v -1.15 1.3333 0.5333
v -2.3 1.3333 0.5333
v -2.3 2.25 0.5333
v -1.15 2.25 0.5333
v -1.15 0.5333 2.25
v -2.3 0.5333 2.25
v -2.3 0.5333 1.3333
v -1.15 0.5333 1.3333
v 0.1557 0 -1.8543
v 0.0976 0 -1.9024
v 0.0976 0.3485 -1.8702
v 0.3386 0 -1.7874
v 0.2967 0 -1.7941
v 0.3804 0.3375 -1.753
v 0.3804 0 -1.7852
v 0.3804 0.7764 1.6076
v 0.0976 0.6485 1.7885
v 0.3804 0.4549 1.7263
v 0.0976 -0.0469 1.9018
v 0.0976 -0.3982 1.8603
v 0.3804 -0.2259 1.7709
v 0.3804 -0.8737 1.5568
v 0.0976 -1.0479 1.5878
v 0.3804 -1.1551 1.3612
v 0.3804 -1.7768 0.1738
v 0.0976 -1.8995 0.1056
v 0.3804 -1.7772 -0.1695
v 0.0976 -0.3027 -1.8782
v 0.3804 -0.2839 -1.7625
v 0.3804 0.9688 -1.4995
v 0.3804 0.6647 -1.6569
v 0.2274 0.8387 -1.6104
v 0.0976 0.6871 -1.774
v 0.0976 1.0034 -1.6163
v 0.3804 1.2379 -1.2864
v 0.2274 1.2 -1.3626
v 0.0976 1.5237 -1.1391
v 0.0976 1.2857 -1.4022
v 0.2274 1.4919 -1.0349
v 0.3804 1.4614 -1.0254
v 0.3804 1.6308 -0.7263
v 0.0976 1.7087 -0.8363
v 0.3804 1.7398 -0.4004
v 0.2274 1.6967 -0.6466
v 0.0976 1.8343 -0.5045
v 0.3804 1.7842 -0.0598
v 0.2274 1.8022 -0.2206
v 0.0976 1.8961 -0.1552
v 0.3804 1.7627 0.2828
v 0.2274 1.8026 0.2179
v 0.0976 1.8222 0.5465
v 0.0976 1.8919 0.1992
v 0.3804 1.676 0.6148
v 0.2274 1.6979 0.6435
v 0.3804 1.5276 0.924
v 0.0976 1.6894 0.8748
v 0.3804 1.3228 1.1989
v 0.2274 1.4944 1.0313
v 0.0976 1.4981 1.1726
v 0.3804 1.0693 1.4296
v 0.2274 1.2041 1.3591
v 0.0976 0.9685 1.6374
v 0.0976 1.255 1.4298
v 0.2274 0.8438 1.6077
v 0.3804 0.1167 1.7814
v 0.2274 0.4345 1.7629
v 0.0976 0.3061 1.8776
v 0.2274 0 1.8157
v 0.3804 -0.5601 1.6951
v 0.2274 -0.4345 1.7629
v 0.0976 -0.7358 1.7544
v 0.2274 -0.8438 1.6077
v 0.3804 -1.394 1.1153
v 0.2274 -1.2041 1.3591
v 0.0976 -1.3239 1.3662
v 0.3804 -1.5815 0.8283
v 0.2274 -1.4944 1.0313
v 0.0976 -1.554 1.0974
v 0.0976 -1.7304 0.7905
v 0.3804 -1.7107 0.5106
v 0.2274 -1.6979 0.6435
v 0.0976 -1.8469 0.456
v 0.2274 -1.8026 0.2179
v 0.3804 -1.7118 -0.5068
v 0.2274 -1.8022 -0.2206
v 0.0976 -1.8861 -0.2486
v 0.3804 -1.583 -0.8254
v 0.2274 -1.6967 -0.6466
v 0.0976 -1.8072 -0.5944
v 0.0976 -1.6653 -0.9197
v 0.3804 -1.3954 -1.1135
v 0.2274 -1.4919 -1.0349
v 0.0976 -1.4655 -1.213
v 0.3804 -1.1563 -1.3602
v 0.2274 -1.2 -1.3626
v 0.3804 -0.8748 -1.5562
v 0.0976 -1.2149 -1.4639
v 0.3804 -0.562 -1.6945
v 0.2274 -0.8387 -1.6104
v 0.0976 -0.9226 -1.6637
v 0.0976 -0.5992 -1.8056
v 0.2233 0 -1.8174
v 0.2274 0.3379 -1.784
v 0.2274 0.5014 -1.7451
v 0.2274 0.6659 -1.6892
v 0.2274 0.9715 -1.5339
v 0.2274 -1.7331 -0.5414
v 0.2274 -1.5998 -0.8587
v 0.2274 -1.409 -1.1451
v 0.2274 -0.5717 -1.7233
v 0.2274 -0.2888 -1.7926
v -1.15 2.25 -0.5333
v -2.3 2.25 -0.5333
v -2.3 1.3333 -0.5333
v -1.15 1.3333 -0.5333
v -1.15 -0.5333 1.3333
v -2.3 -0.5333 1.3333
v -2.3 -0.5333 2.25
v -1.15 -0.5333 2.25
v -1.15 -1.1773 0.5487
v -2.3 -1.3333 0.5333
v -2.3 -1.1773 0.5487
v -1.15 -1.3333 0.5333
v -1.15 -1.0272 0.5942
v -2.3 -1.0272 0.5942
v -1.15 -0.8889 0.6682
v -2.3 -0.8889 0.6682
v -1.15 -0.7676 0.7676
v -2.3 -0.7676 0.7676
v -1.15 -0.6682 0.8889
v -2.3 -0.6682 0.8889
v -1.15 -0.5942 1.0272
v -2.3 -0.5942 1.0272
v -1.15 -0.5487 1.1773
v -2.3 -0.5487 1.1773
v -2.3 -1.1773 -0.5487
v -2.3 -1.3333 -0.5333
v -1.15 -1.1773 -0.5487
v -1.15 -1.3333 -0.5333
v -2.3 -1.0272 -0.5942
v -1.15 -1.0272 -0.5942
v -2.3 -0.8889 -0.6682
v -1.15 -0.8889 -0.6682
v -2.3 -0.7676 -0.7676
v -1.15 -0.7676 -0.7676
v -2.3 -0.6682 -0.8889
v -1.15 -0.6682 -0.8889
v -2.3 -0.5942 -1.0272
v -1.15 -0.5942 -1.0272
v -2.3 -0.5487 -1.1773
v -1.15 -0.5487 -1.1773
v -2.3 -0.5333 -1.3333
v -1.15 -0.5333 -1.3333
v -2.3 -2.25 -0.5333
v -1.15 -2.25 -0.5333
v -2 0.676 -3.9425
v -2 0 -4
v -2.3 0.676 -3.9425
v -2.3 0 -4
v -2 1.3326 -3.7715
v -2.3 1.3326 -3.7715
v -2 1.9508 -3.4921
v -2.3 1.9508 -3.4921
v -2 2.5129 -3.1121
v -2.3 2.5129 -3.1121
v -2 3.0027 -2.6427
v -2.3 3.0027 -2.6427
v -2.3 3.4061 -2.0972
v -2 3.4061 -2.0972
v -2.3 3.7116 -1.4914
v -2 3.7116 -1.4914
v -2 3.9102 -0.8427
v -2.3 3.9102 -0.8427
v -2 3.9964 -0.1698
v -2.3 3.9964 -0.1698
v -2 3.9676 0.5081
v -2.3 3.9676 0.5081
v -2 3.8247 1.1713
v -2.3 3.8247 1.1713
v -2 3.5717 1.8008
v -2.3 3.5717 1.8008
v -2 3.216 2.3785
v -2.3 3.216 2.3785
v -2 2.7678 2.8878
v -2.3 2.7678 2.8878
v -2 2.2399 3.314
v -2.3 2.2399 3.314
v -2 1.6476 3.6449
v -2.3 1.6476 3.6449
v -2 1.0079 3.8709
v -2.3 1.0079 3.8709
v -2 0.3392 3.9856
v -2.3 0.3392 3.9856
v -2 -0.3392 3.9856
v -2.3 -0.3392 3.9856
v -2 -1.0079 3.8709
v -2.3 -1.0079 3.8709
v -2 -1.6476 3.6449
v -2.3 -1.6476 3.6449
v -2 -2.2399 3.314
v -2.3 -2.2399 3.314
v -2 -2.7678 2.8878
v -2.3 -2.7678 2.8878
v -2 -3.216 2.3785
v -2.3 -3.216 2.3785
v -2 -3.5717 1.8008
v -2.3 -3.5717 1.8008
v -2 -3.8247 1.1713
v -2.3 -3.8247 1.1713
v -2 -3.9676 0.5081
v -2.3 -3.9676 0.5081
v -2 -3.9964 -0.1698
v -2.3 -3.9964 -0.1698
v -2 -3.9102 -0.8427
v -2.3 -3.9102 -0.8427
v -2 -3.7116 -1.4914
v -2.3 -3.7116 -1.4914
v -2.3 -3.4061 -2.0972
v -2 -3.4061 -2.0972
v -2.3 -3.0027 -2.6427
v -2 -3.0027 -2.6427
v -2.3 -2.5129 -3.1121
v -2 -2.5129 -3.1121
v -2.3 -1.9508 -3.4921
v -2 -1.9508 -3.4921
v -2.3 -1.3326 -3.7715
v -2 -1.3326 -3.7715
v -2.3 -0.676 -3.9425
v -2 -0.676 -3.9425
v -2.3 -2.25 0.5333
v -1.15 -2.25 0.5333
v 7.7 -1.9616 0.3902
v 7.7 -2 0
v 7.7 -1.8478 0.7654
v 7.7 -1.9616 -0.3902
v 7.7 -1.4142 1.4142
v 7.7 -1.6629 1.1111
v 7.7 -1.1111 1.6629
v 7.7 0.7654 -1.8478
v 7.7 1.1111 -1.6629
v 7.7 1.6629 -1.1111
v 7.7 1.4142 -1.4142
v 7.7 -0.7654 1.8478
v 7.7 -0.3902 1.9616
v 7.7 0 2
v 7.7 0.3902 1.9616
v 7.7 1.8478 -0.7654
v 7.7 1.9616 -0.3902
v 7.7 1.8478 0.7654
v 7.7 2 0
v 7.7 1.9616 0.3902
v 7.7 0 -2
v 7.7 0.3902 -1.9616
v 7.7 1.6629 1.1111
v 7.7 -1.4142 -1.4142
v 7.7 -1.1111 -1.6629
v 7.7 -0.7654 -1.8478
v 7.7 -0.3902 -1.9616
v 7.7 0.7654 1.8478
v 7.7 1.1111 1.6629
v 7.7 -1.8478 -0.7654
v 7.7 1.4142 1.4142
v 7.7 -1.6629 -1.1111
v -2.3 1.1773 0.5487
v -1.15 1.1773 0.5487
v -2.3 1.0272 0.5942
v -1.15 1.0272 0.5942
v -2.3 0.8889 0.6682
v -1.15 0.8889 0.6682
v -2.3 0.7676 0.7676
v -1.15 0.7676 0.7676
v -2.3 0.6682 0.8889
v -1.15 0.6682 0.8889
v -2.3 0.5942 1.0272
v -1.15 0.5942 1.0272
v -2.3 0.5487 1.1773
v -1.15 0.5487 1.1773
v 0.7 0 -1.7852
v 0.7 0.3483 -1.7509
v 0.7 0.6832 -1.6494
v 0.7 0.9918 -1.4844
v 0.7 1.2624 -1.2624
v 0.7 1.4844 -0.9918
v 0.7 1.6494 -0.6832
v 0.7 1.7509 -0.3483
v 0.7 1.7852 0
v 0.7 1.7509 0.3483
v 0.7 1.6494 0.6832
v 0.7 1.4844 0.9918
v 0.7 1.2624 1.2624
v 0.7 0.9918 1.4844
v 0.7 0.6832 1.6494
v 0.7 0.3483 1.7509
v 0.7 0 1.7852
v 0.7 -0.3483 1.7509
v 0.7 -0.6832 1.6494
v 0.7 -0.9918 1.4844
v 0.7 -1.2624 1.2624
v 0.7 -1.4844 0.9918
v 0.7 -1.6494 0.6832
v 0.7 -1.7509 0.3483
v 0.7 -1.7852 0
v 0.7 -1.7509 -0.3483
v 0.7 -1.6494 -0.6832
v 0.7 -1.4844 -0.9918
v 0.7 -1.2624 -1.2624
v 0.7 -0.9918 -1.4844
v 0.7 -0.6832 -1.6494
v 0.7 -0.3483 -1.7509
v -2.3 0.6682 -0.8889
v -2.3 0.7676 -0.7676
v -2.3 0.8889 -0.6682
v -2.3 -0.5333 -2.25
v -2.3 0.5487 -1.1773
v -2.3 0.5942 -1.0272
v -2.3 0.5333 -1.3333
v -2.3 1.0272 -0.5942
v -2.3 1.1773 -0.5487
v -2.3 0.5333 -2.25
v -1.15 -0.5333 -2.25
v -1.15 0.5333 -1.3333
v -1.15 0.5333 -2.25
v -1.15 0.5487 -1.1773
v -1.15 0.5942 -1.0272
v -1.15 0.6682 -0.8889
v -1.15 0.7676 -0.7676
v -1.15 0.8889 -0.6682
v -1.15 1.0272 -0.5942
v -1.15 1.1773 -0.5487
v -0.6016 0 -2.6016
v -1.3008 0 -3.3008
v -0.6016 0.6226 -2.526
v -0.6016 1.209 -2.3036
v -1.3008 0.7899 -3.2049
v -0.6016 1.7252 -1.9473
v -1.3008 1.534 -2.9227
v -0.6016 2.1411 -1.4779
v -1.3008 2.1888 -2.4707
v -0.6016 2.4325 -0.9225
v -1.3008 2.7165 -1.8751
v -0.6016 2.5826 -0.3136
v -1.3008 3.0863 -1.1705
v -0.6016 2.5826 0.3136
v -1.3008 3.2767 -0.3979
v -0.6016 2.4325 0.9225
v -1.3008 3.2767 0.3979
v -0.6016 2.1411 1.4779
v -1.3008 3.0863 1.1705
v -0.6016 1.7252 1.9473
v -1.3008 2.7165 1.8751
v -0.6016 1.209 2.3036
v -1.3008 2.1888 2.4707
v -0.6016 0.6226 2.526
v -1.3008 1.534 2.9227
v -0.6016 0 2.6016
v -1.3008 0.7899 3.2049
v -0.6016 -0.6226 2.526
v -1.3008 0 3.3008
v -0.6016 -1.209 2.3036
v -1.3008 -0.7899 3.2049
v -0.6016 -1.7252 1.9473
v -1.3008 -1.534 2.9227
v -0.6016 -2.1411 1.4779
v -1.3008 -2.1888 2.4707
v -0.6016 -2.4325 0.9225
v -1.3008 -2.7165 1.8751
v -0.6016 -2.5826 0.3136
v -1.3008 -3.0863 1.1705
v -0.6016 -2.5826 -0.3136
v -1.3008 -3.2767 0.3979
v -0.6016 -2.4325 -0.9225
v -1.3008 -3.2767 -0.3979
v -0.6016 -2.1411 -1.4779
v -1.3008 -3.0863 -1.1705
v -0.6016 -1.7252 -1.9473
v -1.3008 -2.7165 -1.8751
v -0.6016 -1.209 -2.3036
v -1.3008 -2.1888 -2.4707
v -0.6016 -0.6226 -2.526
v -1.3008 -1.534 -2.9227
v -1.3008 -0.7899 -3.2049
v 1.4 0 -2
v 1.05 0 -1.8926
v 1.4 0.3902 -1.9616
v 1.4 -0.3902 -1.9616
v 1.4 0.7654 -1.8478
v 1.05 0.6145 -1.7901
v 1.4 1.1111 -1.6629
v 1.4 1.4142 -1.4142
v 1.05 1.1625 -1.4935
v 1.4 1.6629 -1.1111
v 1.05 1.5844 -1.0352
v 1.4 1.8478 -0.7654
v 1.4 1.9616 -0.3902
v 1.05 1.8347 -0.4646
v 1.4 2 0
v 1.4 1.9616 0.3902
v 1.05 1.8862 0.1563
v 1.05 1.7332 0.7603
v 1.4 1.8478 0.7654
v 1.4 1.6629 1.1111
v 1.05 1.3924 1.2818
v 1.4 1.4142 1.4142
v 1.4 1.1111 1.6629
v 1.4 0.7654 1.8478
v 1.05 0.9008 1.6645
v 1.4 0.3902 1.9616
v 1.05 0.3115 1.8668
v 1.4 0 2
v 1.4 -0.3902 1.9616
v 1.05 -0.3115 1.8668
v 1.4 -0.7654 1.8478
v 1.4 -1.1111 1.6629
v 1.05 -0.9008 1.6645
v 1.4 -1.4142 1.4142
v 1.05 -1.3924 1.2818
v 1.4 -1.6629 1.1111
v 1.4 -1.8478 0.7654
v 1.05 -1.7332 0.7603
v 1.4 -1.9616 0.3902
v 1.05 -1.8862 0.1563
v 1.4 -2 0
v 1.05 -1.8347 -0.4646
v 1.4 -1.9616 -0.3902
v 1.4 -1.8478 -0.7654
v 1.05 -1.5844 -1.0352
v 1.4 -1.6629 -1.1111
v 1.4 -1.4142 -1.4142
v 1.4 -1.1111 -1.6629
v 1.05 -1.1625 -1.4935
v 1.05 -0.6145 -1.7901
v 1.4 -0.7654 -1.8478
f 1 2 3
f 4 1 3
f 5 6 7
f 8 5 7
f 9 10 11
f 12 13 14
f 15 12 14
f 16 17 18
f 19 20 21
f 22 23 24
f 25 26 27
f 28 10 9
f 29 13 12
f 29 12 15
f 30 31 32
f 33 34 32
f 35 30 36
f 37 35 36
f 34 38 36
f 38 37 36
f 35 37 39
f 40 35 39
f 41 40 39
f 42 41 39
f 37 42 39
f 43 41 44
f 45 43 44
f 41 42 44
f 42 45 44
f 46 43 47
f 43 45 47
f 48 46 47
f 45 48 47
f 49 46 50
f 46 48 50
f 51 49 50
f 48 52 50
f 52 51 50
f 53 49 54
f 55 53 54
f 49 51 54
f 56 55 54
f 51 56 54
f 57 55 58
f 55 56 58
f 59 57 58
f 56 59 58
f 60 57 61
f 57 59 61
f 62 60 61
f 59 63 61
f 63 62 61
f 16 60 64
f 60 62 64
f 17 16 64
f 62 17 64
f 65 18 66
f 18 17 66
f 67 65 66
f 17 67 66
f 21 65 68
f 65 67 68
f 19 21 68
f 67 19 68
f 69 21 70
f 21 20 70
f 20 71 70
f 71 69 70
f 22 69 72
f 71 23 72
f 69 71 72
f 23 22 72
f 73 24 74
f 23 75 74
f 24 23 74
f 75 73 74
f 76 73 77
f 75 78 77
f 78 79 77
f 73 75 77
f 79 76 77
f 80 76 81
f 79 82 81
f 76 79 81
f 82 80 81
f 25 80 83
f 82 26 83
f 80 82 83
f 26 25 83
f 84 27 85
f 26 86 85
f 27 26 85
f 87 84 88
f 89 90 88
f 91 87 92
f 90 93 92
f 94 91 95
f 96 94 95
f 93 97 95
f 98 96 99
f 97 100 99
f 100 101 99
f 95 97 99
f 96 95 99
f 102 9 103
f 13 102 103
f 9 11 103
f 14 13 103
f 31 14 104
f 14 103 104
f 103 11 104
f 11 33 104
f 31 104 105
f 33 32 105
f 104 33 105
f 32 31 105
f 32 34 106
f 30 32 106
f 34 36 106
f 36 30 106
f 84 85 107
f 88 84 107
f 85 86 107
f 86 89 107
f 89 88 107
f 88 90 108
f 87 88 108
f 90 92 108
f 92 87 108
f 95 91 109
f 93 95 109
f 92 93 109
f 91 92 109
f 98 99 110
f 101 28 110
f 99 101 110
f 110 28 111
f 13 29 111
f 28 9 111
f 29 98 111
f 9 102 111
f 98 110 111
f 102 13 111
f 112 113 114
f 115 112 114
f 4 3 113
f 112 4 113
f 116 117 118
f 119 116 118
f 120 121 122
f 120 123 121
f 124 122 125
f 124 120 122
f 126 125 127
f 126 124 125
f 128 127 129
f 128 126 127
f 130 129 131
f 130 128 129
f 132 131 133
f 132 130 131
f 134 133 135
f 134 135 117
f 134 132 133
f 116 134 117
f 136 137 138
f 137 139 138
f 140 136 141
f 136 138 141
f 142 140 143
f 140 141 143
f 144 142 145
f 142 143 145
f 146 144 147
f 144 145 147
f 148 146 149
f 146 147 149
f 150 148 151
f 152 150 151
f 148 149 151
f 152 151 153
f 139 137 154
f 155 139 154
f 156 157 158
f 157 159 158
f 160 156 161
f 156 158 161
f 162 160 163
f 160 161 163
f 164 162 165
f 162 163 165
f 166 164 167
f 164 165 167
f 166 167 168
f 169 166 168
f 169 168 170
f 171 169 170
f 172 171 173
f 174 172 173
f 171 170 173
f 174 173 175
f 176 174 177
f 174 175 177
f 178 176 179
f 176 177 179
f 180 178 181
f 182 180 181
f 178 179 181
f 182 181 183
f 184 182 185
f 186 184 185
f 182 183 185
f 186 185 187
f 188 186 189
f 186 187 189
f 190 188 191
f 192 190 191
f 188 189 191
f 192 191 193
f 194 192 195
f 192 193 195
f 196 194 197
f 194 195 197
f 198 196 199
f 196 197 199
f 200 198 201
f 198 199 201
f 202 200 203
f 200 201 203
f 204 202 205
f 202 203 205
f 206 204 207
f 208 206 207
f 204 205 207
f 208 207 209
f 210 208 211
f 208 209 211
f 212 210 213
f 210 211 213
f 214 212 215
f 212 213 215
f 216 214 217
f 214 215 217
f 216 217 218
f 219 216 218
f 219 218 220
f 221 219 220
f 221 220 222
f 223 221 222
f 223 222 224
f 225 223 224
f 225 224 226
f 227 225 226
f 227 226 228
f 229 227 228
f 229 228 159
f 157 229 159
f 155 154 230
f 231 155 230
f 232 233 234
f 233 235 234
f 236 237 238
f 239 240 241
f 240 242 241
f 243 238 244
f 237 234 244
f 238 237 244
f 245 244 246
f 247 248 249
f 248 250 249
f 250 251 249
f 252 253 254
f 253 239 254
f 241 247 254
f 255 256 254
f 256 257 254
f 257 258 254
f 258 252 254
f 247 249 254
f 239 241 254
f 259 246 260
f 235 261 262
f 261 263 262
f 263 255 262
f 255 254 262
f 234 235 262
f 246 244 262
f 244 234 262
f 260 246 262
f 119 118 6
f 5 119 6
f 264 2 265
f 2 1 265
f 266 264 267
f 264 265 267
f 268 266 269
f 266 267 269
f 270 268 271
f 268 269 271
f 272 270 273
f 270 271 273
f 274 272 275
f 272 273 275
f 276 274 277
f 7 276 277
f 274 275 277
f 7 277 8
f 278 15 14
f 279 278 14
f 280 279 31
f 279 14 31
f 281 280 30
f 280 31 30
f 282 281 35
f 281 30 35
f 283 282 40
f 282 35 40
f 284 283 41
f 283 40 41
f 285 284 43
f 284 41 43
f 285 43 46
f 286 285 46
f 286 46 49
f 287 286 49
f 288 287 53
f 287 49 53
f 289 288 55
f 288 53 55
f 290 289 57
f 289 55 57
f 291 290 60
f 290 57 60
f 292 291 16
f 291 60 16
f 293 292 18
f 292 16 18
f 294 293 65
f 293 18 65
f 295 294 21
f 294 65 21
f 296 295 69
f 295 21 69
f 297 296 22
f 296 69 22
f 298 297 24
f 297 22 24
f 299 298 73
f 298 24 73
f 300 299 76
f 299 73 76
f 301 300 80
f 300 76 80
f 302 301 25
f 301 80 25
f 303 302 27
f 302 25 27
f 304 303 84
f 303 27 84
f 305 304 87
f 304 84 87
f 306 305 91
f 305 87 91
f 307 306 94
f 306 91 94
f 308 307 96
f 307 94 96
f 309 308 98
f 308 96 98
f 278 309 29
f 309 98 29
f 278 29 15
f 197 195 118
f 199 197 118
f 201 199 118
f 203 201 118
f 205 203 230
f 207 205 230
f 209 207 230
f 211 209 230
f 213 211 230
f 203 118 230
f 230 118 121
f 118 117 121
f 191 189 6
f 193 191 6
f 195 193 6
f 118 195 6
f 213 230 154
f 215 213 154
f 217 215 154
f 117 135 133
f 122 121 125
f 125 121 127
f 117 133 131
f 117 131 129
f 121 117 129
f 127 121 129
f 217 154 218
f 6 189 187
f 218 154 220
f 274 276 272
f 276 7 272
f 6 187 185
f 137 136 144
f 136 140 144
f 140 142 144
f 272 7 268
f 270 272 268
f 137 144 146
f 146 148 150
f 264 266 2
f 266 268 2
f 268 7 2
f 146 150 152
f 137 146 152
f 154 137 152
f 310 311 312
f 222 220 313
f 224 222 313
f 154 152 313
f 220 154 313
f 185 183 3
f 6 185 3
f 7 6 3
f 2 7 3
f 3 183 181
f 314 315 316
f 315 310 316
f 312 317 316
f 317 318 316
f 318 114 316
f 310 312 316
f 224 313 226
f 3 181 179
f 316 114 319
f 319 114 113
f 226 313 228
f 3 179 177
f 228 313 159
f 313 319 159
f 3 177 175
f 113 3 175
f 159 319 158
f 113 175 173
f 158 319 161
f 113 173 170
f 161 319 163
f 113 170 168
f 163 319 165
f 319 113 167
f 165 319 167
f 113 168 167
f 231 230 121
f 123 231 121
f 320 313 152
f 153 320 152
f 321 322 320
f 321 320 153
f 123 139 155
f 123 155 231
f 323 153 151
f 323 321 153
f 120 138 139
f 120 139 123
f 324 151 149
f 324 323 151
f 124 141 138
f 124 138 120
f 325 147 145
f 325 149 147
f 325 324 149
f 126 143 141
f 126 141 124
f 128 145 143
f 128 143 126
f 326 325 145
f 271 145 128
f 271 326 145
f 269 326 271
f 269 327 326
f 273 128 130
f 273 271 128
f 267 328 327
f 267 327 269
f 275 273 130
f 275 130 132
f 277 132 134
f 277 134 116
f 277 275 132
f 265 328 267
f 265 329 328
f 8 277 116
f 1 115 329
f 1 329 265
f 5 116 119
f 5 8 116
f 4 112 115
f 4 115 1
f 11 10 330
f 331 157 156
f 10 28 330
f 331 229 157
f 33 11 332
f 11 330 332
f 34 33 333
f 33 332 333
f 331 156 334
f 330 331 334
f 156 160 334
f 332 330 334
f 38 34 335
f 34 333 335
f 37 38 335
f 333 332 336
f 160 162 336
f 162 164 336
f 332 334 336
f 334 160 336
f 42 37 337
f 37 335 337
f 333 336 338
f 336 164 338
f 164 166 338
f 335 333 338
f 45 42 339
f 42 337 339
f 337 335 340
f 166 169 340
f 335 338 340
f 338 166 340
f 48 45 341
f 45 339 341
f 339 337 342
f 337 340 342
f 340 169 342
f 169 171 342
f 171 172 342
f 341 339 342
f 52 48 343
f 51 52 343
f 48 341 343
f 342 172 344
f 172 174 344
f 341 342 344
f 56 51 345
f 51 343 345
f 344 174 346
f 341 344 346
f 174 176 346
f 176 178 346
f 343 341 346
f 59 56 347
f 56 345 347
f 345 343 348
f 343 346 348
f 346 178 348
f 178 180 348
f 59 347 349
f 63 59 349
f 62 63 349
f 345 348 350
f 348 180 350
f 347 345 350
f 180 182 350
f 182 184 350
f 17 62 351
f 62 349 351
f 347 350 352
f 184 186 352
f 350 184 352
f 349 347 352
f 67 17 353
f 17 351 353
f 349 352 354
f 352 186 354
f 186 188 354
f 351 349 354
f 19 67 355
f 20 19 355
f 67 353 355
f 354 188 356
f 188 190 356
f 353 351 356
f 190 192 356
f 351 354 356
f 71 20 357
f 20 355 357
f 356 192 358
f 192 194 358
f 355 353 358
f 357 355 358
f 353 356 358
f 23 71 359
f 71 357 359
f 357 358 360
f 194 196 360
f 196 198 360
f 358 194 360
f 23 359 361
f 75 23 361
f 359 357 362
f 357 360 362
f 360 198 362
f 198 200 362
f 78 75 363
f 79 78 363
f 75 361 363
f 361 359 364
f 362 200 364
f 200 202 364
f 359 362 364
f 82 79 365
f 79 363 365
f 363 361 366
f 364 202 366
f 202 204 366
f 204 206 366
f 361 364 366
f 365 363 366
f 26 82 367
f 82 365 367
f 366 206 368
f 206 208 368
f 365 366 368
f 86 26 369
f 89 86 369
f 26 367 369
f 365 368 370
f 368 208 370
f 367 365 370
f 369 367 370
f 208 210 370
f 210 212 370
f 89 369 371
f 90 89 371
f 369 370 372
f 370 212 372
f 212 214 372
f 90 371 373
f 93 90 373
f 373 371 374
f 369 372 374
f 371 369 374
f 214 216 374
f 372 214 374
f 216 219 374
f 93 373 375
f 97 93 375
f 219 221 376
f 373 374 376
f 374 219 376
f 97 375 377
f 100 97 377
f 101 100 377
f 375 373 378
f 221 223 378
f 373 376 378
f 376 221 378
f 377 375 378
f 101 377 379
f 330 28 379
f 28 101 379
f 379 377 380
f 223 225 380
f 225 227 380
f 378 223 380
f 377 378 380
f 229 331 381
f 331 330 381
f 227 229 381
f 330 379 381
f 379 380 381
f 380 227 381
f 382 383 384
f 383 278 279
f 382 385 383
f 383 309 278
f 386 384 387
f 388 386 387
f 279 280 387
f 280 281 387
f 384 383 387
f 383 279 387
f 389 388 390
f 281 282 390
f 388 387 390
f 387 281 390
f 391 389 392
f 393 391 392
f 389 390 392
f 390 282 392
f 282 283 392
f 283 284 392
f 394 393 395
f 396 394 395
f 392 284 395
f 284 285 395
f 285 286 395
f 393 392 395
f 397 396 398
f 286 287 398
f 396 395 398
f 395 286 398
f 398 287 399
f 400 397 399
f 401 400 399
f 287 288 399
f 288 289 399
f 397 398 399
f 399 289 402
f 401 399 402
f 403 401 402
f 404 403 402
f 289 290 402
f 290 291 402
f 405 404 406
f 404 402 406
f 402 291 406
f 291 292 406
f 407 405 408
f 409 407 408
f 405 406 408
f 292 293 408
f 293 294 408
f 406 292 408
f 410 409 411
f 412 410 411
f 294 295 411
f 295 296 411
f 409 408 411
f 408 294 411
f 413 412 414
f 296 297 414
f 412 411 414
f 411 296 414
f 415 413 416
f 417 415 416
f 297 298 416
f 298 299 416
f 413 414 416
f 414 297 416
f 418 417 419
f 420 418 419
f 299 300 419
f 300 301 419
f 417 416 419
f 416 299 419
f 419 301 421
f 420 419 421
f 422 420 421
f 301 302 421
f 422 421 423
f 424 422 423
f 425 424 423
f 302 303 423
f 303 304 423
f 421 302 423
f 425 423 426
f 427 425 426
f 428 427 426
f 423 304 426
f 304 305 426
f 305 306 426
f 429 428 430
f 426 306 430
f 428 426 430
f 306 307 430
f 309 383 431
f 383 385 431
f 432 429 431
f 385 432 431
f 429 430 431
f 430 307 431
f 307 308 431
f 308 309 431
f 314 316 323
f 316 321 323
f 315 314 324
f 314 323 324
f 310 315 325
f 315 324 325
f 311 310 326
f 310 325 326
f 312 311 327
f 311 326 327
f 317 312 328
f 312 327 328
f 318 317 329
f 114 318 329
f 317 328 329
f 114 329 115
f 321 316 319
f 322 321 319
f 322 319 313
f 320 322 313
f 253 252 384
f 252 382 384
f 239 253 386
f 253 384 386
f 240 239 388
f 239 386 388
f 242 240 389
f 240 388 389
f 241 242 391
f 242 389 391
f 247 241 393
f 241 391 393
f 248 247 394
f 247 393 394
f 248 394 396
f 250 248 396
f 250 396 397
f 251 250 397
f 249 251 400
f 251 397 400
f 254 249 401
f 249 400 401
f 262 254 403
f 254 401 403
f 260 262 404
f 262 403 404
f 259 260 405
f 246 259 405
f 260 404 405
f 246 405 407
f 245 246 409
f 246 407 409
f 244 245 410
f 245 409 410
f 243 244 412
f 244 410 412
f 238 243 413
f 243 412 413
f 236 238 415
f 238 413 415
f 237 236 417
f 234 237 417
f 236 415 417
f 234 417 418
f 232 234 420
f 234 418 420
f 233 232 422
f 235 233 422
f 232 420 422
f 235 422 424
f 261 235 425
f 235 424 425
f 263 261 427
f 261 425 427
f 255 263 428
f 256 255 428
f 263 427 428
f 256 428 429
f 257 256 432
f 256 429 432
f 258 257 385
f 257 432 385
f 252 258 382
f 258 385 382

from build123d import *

# Parameters (mm, degrees)
CUT_EXTRUDE_1_DEPTH = 1.15
FILLET_1_R          = 0.4
FILLET_2_R          = 0.8


with BuildPart() as part:
    # 草圖1 → 旋轉1 (revolve)
    with BuildSketch(Plane.XY, mode=Mode.PRIVATE) as revolve_1_sk:
        Polygon((-2.3, 4), (-2.3, 0), (7.7, 0), (7.7, 2), (1.4, 2), (0.7, 1.78525), (0.21475, 1.78525), (-2, 4), align=None)
    revolve(revolve_1_sk.sketch.rotate(Axis((-2.3, 0, 0), (1, 0, 0)), 270), axis=Axis((-2.3, 0, 0), (1, 0, 0)))

    # 草圖2 → 除料-伸長1 (cut)
    with BuildSketch(Plane.ZY.offset(2.3)):
        Polygon((0.533333333, -0.533333333), (2.25, -0.533333333), (2.25, 0.533333333), (0.533333333, 0.533333333), (0.533333333, 2.25), (-0.533333333, 2.25), (-0.533333333, 0.533333333), (-2.25, 0.533333333), (-2.25, -0.533333333), (-0.533333333, -0.533333333), (-0.533333333, -2.25), (0.533333333, -2.25), align=None)
    extrude(amount=-CUT_EXTRUDE_1_DEPTH, mode=Mode.SUBTRACT)

    # 圓角1
    fillet_1_edges = [part.edges().sort_by_distance(p)[0] for p in [
        (0.21475, 0, 1.78525),
    ]]
    fillet(fillet_1_edges, radius=FILLET_1_R)

    # 圓角2
    fillet_2_edges = [part.edges().sort_by_distance(p)[0] for p in [
        (-1.725, -0.533333333, 0.533333333),
        (-1.725, -0.533333333, -0.533333333),
        (-1.725, 0.533333333, -0.533333333),
        (-1.725, 0.533333333, 0.533333333),
    ]]
    fillet(fillet_2_edges, radius=FILLET_2_R)


solid = part.part
